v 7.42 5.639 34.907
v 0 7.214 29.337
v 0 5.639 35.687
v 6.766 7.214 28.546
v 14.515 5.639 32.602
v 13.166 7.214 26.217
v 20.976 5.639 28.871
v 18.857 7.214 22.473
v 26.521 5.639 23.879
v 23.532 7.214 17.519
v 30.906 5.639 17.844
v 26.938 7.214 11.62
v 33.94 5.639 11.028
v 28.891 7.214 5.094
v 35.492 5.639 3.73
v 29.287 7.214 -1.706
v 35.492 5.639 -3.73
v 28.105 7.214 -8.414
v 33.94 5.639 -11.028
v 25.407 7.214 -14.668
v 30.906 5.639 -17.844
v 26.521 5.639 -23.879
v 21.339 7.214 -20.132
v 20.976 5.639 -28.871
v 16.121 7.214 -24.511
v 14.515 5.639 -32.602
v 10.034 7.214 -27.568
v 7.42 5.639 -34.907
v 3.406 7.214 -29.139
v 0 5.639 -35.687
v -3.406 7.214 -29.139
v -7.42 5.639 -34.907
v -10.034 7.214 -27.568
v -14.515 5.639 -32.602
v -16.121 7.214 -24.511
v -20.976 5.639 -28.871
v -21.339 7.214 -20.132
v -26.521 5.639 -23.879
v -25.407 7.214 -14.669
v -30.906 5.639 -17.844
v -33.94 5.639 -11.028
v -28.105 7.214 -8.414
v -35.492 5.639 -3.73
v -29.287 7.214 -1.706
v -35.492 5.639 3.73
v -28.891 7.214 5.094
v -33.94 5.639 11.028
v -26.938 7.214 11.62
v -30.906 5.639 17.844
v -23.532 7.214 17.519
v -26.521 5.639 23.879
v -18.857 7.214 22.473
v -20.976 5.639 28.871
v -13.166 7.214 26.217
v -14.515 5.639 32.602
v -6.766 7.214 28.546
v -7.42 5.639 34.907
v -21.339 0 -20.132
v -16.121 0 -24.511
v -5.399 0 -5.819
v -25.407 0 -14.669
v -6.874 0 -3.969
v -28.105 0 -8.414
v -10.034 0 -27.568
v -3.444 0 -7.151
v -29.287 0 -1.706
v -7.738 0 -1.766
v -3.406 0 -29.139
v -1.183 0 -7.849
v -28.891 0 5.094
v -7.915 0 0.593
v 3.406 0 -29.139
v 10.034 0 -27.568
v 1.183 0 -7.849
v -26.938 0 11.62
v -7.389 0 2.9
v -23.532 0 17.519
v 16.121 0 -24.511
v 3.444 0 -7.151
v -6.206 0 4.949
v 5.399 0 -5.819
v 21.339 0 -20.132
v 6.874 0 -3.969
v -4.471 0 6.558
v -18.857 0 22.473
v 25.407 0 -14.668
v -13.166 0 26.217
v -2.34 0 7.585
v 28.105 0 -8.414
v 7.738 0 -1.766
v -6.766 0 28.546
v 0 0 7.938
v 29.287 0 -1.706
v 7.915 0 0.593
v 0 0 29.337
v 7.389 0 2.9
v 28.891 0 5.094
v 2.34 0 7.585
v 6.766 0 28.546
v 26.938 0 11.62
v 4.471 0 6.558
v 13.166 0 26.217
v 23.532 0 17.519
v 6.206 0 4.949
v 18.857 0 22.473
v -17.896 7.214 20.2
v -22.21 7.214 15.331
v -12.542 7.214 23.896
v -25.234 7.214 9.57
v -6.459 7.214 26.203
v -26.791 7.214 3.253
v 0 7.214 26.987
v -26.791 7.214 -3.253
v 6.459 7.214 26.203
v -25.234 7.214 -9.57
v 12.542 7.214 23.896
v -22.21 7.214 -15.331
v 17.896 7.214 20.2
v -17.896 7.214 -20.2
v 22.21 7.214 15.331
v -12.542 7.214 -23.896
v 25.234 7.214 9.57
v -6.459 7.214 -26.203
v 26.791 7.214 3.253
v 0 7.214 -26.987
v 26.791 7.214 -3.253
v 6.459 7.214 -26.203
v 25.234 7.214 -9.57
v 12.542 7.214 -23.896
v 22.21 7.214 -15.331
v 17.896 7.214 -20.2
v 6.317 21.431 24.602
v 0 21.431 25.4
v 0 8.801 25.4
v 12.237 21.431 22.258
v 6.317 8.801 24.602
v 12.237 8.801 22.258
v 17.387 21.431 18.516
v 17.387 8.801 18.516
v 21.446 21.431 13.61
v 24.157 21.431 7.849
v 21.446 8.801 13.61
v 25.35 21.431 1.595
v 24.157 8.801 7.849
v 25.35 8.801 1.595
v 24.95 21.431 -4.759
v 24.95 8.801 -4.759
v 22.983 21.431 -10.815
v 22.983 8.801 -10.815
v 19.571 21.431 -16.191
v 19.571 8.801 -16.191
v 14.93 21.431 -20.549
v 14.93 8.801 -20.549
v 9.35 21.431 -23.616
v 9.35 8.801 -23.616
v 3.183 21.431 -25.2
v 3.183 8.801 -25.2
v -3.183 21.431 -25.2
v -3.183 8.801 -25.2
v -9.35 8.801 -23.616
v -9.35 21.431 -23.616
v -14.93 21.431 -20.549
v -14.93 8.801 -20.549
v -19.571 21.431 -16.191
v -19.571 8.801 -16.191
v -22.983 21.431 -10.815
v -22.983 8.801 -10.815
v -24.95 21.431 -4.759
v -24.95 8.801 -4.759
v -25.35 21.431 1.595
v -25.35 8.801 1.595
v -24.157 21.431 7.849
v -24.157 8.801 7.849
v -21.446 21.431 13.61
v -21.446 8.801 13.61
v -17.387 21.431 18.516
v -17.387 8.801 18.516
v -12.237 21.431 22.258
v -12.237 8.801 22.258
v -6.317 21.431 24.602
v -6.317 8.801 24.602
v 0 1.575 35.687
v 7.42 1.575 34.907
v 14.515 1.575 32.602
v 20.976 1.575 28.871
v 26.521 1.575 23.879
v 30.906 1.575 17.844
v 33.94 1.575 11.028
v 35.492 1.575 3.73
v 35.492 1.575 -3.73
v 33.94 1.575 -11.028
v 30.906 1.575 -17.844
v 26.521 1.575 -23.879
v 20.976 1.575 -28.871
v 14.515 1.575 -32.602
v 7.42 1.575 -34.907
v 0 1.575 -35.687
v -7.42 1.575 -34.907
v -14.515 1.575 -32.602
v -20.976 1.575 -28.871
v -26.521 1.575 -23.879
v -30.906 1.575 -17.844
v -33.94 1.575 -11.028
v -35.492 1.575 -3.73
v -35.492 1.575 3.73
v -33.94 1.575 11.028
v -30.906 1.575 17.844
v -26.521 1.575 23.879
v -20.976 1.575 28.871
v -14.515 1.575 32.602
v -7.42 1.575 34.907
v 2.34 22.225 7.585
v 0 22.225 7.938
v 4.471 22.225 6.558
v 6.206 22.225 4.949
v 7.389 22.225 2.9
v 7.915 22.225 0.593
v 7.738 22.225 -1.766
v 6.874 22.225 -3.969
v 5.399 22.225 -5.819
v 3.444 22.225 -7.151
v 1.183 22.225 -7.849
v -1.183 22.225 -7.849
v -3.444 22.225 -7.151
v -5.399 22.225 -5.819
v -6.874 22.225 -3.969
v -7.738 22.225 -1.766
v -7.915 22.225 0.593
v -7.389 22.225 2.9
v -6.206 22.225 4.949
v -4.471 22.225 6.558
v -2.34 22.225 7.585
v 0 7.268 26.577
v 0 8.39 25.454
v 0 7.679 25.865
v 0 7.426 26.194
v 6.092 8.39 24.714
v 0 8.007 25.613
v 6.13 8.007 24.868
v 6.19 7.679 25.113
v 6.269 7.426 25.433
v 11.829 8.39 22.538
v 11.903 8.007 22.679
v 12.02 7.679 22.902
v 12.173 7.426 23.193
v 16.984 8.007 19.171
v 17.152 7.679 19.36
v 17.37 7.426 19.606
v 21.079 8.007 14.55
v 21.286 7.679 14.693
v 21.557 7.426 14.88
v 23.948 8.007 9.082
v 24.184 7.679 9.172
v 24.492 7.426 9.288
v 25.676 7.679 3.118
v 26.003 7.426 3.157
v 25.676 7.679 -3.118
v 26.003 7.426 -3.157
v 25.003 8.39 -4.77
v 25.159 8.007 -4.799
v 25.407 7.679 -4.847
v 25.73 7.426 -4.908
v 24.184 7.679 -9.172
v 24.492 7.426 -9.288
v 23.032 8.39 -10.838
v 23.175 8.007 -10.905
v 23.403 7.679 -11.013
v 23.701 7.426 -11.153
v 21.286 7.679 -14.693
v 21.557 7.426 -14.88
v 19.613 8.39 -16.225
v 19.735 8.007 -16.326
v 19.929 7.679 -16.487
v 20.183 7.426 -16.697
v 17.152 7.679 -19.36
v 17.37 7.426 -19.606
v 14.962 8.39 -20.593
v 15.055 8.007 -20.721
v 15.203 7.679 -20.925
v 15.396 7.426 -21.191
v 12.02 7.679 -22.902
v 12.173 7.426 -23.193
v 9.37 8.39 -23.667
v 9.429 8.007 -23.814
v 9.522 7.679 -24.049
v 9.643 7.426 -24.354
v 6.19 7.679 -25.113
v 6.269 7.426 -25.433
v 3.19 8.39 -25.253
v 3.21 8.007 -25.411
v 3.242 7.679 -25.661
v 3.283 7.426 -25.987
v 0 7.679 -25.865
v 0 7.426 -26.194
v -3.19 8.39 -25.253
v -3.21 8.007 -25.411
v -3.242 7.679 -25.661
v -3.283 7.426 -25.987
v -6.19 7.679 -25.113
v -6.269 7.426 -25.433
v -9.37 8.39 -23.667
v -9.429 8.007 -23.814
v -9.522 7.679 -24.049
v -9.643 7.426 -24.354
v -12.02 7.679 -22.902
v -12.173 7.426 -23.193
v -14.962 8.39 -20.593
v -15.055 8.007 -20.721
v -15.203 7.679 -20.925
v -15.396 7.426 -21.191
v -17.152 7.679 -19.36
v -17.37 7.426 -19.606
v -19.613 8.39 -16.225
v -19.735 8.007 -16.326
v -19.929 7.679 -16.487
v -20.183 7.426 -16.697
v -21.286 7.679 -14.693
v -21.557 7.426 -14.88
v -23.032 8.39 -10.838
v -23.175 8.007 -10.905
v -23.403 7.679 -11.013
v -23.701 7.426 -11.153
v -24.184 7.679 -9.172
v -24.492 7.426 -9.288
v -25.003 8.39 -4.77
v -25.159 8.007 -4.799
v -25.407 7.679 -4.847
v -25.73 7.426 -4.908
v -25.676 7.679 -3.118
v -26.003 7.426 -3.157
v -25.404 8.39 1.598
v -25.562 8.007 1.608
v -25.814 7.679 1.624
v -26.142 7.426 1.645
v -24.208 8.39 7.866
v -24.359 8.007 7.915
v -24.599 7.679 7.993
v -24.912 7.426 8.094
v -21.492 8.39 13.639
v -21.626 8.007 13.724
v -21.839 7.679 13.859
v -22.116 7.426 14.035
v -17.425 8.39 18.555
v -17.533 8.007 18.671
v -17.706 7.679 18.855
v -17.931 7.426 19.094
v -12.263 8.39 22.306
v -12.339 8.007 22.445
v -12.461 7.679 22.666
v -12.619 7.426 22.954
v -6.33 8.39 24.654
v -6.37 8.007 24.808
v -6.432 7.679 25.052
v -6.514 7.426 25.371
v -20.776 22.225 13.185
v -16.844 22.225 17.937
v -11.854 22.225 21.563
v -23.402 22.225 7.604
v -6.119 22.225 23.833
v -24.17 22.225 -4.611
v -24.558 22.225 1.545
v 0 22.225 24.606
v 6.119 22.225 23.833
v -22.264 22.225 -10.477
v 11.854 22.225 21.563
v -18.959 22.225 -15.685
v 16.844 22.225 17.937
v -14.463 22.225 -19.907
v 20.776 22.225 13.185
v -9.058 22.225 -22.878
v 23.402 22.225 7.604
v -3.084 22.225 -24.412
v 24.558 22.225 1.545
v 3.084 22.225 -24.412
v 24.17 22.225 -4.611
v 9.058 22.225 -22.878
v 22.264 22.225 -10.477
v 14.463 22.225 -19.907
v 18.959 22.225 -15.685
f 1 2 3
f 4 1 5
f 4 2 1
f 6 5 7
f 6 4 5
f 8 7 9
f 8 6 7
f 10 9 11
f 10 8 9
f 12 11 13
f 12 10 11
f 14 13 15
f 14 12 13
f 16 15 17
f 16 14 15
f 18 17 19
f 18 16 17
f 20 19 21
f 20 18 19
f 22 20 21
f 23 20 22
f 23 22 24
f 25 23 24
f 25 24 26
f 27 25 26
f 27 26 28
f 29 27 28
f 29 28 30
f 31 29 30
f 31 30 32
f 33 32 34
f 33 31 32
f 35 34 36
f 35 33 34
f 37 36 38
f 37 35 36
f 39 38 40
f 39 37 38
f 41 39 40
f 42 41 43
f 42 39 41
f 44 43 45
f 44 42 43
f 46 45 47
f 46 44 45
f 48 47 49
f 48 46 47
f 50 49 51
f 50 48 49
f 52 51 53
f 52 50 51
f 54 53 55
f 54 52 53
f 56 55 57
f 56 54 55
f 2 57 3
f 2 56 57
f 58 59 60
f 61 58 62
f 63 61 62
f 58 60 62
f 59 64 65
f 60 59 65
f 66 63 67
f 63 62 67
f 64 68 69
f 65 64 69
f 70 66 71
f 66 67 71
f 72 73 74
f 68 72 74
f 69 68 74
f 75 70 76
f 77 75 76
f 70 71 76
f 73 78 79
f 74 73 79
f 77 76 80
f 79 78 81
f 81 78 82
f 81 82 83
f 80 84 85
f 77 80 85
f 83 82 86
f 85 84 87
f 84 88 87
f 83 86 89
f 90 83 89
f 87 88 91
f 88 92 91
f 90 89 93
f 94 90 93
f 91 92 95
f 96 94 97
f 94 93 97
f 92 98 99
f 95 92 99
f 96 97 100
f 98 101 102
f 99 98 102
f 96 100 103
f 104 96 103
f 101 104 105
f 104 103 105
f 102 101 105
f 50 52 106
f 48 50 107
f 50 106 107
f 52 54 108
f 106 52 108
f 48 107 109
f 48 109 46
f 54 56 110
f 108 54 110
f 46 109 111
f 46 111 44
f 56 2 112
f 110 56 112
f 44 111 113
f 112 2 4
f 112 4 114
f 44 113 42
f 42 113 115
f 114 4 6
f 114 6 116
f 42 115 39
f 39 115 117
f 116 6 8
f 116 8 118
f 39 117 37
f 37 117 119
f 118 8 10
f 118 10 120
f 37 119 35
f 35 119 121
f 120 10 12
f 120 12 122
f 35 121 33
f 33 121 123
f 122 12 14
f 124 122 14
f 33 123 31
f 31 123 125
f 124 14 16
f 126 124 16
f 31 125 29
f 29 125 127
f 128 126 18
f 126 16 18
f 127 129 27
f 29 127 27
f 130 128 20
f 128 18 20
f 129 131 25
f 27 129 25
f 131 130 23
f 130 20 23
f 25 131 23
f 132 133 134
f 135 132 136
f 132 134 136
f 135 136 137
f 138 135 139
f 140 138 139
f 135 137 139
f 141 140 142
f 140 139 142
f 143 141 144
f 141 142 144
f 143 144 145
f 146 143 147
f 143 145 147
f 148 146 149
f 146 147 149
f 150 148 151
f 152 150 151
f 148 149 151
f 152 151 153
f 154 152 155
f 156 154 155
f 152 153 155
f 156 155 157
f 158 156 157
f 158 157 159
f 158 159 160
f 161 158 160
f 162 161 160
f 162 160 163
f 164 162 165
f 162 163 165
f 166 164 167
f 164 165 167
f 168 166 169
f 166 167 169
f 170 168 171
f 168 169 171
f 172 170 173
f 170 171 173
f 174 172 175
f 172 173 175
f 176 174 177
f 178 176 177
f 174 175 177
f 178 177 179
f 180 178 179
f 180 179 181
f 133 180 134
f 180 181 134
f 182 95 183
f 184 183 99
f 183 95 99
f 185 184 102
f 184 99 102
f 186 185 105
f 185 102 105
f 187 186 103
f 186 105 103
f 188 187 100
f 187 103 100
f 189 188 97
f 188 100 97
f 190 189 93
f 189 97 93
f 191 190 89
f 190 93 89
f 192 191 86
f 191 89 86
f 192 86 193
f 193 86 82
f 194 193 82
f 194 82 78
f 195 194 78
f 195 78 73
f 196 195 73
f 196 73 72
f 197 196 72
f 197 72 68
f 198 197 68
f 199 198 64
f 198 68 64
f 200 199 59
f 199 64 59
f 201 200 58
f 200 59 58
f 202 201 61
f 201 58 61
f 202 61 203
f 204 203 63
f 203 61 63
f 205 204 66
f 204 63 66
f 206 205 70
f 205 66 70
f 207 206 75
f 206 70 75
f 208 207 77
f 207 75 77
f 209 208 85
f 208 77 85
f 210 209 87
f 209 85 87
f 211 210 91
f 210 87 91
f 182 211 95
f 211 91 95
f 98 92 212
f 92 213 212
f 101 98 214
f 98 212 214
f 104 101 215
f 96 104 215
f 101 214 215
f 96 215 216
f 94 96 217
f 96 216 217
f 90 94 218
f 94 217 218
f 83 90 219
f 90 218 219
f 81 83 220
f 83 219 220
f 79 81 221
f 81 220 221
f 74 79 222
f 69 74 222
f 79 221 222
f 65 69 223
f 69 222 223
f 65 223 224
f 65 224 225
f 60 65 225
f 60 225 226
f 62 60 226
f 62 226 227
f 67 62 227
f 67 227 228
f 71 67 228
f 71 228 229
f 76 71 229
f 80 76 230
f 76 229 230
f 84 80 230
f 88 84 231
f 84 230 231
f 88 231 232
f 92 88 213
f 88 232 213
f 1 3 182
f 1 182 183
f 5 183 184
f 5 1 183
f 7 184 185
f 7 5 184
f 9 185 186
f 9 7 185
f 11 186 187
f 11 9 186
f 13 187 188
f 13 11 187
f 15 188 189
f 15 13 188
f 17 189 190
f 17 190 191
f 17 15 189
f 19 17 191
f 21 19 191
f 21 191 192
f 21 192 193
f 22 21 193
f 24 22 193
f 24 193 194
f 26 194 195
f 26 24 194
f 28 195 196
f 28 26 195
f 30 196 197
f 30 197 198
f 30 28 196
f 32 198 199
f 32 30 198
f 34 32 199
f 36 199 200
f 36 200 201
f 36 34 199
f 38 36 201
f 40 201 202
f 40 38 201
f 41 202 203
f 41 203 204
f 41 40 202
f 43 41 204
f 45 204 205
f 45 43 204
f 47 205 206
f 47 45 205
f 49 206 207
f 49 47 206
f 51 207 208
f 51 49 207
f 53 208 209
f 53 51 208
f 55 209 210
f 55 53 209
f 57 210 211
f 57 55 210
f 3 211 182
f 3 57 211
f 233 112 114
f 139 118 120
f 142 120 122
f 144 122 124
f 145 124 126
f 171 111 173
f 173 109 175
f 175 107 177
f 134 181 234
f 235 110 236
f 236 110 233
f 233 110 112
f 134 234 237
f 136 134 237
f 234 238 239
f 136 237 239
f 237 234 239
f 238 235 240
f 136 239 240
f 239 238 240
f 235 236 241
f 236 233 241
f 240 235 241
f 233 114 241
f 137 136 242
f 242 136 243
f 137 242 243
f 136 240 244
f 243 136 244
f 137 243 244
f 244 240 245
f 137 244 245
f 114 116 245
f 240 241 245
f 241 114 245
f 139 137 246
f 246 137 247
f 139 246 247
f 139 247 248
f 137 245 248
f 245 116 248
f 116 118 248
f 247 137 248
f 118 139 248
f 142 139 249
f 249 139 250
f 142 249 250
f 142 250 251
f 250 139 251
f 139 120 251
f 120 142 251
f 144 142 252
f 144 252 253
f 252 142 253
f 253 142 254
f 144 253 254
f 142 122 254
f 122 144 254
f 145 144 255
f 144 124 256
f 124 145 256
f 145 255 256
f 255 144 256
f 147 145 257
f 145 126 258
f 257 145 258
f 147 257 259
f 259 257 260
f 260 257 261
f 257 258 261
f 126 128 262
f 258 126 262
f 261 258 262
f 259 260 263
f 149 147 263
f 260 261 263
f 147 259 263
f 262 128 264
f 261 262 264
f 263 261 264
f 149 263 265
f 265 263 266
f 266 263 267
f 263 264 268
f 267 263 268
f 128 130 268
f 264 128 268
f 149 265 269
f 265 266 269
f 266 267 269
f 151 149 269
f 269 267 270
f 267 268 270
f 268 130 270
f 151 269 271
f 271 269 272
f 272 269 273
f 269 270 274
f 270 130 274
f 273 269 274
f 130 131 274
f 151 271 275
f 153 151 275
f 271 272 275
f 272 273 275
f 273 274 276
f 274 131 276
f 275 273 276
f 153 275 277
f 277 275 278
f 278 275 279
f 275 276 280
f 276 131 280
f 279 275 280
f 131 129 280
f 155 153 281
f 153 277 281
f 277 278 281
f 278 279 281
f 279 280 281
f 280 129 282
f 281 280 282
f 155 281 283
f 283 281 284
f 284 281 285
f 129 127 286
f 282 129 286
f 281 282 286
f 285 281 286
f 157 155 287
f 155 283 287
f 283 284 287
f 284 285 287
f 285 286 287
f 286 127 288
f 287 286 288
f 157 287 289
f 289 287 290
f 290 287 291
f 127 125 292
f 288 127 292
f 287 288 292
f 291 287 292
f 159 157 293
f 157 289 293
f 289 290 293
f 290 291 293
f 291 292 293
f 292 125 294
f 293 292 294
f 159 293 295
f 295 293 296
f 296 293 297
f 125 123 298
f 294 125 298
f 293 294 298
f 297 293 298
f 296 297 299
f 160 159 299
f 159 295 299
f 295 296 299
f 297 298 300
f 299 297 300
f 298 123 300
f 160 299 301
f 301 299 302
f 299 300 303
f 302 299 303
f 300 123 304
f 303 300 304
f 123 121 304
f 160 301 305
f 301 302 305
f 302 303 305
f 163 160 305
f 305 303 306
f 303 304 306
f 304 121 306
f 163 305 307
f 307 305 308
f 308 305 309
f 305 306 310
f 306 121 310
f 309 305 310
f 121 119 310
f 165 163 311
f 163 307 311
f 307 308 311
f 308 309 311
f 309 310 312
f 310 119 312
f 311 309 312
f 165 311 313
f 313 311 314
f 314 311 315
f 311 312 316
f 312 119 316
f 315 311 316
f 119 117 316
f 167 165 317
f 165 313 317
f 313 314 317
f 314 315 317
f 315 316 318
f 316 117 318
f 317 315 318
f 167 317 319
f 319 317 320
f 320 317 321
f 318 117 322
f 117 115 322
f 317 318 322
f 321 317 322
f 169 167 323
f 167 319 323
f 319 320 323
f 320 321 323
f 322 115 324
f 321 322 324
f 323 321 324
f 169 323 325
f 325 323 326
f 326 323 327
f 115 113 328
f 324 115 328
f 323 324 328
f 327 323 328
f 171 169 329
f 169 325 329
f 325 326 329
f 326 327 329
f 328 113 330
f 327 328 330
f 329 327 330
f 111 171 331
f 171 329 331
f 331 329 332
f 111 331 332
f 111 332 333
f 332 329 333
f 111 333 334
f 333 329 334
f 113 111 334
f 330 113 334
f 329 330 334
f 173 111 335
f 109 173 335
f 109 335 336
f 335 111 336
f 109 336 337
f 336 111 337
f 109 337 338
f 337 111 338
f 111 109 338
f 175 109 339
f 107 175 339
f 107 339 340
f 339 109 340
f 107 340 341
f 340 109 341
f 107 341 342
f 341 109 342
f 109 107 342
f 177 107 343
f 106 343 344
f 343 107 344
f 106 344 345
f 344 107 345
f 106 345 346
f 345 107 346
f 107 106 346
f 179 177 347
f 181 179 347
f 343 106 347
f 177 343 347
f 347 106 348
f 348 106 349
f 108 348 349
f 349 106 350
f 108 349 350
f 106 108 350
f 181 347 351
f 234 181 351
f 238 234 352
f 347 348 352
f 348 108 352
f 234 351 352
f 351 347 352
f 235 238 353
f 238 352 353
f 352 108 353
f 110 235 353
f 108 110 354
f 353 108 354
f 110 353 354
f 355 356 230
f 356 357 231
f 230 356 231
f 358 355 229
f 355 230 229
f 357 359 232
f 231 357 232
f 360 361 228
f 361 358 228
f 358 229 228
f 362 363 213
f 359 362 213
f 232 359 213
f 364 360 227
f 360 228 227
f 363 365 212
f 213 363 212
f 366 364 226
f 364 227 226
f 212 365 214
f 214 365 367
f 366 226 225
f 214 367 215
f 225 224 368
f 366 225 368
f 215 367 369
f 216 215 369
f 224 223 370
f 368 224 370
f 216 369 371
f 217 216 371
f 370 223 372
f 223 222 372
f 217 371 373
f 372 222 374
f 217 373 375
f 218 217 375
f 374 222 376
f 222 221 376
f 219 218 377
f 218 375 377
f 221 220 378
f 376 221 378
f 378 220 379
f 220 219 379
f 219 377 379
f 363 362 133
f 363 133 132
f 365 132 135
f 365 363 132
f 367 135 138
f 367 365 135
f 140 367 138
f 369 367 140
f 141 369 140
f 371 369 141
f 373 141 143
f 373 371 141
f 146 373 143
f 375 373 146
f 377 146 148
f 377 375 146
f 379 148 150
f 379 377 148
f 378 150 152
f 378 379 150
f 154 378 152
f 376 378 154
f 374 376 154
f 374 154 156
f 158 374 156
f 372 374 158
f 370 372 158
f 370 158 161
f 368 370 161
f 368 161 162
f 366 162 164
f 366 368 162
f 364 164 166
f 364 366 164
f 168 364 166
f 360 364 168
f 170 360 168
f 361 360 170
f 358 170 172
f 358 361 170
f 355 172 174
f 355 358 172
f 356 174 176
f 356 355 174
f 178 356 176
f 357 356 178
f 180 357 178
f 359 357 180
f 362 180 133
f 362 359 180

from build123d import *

# Parameters (mm, degrees)
F0_W     = 15.0114
F0_H     = 17.4625
F0_W_2   = 7.2136
F0_H_2   = 10.287
F2_R     = 1.5875
F3_SIZE  = 0.79375
F4_SIZE2 = 6.35
F4_SIZE  = 1.5748


with BuildPart() as f1:
    # F0 (on Right) → F1 (revolve)
    with BuildSketch(Plane.YZ):
        with Locations((14.7193, 16.66875)):
            Rectangle(F0_W, F0_H)
        with Locations((3.6068, 16.66875)):
            Rectangle(F0_W_2, F0_H)
        with Locations((3.6068, 30.5435)):
            Rectangle(F0_W_2, F0_H_2)
    revolve(axis=Axis((0, 11.1125, 0), (0, 1, 0)))

    # F2
    f2_edges = [f1.edges().sort_by_distance(p)[0] for p in [
        (0, 7.2136, -25.4),
    ]]
    fillet(f2_edges, radius=F2_R)

    # F3
    f3_edges = [f1.edges().sort_by_distance(p)[0] for p in [
        (0, 22.225, -25.4),
    ]]
    chamfer(f3_edges, length=F3_SIZE)

    # F4
    f4_edges = [f1.edges().sort_by_distance(p)[0] for p in [
        (0, 7.2136, -35.687),
        (0, 0, -35.687),
        (0, 3.6068, 35.687),
    ]]
    f4_side = f1.faces().sort_by_distance((0, 3.6068, -35.687))[0]
    chamfer(f4_edges, length=F4_SIZE, length2=F4_SIZE2, reference=f4_side)


solid = f1.part
